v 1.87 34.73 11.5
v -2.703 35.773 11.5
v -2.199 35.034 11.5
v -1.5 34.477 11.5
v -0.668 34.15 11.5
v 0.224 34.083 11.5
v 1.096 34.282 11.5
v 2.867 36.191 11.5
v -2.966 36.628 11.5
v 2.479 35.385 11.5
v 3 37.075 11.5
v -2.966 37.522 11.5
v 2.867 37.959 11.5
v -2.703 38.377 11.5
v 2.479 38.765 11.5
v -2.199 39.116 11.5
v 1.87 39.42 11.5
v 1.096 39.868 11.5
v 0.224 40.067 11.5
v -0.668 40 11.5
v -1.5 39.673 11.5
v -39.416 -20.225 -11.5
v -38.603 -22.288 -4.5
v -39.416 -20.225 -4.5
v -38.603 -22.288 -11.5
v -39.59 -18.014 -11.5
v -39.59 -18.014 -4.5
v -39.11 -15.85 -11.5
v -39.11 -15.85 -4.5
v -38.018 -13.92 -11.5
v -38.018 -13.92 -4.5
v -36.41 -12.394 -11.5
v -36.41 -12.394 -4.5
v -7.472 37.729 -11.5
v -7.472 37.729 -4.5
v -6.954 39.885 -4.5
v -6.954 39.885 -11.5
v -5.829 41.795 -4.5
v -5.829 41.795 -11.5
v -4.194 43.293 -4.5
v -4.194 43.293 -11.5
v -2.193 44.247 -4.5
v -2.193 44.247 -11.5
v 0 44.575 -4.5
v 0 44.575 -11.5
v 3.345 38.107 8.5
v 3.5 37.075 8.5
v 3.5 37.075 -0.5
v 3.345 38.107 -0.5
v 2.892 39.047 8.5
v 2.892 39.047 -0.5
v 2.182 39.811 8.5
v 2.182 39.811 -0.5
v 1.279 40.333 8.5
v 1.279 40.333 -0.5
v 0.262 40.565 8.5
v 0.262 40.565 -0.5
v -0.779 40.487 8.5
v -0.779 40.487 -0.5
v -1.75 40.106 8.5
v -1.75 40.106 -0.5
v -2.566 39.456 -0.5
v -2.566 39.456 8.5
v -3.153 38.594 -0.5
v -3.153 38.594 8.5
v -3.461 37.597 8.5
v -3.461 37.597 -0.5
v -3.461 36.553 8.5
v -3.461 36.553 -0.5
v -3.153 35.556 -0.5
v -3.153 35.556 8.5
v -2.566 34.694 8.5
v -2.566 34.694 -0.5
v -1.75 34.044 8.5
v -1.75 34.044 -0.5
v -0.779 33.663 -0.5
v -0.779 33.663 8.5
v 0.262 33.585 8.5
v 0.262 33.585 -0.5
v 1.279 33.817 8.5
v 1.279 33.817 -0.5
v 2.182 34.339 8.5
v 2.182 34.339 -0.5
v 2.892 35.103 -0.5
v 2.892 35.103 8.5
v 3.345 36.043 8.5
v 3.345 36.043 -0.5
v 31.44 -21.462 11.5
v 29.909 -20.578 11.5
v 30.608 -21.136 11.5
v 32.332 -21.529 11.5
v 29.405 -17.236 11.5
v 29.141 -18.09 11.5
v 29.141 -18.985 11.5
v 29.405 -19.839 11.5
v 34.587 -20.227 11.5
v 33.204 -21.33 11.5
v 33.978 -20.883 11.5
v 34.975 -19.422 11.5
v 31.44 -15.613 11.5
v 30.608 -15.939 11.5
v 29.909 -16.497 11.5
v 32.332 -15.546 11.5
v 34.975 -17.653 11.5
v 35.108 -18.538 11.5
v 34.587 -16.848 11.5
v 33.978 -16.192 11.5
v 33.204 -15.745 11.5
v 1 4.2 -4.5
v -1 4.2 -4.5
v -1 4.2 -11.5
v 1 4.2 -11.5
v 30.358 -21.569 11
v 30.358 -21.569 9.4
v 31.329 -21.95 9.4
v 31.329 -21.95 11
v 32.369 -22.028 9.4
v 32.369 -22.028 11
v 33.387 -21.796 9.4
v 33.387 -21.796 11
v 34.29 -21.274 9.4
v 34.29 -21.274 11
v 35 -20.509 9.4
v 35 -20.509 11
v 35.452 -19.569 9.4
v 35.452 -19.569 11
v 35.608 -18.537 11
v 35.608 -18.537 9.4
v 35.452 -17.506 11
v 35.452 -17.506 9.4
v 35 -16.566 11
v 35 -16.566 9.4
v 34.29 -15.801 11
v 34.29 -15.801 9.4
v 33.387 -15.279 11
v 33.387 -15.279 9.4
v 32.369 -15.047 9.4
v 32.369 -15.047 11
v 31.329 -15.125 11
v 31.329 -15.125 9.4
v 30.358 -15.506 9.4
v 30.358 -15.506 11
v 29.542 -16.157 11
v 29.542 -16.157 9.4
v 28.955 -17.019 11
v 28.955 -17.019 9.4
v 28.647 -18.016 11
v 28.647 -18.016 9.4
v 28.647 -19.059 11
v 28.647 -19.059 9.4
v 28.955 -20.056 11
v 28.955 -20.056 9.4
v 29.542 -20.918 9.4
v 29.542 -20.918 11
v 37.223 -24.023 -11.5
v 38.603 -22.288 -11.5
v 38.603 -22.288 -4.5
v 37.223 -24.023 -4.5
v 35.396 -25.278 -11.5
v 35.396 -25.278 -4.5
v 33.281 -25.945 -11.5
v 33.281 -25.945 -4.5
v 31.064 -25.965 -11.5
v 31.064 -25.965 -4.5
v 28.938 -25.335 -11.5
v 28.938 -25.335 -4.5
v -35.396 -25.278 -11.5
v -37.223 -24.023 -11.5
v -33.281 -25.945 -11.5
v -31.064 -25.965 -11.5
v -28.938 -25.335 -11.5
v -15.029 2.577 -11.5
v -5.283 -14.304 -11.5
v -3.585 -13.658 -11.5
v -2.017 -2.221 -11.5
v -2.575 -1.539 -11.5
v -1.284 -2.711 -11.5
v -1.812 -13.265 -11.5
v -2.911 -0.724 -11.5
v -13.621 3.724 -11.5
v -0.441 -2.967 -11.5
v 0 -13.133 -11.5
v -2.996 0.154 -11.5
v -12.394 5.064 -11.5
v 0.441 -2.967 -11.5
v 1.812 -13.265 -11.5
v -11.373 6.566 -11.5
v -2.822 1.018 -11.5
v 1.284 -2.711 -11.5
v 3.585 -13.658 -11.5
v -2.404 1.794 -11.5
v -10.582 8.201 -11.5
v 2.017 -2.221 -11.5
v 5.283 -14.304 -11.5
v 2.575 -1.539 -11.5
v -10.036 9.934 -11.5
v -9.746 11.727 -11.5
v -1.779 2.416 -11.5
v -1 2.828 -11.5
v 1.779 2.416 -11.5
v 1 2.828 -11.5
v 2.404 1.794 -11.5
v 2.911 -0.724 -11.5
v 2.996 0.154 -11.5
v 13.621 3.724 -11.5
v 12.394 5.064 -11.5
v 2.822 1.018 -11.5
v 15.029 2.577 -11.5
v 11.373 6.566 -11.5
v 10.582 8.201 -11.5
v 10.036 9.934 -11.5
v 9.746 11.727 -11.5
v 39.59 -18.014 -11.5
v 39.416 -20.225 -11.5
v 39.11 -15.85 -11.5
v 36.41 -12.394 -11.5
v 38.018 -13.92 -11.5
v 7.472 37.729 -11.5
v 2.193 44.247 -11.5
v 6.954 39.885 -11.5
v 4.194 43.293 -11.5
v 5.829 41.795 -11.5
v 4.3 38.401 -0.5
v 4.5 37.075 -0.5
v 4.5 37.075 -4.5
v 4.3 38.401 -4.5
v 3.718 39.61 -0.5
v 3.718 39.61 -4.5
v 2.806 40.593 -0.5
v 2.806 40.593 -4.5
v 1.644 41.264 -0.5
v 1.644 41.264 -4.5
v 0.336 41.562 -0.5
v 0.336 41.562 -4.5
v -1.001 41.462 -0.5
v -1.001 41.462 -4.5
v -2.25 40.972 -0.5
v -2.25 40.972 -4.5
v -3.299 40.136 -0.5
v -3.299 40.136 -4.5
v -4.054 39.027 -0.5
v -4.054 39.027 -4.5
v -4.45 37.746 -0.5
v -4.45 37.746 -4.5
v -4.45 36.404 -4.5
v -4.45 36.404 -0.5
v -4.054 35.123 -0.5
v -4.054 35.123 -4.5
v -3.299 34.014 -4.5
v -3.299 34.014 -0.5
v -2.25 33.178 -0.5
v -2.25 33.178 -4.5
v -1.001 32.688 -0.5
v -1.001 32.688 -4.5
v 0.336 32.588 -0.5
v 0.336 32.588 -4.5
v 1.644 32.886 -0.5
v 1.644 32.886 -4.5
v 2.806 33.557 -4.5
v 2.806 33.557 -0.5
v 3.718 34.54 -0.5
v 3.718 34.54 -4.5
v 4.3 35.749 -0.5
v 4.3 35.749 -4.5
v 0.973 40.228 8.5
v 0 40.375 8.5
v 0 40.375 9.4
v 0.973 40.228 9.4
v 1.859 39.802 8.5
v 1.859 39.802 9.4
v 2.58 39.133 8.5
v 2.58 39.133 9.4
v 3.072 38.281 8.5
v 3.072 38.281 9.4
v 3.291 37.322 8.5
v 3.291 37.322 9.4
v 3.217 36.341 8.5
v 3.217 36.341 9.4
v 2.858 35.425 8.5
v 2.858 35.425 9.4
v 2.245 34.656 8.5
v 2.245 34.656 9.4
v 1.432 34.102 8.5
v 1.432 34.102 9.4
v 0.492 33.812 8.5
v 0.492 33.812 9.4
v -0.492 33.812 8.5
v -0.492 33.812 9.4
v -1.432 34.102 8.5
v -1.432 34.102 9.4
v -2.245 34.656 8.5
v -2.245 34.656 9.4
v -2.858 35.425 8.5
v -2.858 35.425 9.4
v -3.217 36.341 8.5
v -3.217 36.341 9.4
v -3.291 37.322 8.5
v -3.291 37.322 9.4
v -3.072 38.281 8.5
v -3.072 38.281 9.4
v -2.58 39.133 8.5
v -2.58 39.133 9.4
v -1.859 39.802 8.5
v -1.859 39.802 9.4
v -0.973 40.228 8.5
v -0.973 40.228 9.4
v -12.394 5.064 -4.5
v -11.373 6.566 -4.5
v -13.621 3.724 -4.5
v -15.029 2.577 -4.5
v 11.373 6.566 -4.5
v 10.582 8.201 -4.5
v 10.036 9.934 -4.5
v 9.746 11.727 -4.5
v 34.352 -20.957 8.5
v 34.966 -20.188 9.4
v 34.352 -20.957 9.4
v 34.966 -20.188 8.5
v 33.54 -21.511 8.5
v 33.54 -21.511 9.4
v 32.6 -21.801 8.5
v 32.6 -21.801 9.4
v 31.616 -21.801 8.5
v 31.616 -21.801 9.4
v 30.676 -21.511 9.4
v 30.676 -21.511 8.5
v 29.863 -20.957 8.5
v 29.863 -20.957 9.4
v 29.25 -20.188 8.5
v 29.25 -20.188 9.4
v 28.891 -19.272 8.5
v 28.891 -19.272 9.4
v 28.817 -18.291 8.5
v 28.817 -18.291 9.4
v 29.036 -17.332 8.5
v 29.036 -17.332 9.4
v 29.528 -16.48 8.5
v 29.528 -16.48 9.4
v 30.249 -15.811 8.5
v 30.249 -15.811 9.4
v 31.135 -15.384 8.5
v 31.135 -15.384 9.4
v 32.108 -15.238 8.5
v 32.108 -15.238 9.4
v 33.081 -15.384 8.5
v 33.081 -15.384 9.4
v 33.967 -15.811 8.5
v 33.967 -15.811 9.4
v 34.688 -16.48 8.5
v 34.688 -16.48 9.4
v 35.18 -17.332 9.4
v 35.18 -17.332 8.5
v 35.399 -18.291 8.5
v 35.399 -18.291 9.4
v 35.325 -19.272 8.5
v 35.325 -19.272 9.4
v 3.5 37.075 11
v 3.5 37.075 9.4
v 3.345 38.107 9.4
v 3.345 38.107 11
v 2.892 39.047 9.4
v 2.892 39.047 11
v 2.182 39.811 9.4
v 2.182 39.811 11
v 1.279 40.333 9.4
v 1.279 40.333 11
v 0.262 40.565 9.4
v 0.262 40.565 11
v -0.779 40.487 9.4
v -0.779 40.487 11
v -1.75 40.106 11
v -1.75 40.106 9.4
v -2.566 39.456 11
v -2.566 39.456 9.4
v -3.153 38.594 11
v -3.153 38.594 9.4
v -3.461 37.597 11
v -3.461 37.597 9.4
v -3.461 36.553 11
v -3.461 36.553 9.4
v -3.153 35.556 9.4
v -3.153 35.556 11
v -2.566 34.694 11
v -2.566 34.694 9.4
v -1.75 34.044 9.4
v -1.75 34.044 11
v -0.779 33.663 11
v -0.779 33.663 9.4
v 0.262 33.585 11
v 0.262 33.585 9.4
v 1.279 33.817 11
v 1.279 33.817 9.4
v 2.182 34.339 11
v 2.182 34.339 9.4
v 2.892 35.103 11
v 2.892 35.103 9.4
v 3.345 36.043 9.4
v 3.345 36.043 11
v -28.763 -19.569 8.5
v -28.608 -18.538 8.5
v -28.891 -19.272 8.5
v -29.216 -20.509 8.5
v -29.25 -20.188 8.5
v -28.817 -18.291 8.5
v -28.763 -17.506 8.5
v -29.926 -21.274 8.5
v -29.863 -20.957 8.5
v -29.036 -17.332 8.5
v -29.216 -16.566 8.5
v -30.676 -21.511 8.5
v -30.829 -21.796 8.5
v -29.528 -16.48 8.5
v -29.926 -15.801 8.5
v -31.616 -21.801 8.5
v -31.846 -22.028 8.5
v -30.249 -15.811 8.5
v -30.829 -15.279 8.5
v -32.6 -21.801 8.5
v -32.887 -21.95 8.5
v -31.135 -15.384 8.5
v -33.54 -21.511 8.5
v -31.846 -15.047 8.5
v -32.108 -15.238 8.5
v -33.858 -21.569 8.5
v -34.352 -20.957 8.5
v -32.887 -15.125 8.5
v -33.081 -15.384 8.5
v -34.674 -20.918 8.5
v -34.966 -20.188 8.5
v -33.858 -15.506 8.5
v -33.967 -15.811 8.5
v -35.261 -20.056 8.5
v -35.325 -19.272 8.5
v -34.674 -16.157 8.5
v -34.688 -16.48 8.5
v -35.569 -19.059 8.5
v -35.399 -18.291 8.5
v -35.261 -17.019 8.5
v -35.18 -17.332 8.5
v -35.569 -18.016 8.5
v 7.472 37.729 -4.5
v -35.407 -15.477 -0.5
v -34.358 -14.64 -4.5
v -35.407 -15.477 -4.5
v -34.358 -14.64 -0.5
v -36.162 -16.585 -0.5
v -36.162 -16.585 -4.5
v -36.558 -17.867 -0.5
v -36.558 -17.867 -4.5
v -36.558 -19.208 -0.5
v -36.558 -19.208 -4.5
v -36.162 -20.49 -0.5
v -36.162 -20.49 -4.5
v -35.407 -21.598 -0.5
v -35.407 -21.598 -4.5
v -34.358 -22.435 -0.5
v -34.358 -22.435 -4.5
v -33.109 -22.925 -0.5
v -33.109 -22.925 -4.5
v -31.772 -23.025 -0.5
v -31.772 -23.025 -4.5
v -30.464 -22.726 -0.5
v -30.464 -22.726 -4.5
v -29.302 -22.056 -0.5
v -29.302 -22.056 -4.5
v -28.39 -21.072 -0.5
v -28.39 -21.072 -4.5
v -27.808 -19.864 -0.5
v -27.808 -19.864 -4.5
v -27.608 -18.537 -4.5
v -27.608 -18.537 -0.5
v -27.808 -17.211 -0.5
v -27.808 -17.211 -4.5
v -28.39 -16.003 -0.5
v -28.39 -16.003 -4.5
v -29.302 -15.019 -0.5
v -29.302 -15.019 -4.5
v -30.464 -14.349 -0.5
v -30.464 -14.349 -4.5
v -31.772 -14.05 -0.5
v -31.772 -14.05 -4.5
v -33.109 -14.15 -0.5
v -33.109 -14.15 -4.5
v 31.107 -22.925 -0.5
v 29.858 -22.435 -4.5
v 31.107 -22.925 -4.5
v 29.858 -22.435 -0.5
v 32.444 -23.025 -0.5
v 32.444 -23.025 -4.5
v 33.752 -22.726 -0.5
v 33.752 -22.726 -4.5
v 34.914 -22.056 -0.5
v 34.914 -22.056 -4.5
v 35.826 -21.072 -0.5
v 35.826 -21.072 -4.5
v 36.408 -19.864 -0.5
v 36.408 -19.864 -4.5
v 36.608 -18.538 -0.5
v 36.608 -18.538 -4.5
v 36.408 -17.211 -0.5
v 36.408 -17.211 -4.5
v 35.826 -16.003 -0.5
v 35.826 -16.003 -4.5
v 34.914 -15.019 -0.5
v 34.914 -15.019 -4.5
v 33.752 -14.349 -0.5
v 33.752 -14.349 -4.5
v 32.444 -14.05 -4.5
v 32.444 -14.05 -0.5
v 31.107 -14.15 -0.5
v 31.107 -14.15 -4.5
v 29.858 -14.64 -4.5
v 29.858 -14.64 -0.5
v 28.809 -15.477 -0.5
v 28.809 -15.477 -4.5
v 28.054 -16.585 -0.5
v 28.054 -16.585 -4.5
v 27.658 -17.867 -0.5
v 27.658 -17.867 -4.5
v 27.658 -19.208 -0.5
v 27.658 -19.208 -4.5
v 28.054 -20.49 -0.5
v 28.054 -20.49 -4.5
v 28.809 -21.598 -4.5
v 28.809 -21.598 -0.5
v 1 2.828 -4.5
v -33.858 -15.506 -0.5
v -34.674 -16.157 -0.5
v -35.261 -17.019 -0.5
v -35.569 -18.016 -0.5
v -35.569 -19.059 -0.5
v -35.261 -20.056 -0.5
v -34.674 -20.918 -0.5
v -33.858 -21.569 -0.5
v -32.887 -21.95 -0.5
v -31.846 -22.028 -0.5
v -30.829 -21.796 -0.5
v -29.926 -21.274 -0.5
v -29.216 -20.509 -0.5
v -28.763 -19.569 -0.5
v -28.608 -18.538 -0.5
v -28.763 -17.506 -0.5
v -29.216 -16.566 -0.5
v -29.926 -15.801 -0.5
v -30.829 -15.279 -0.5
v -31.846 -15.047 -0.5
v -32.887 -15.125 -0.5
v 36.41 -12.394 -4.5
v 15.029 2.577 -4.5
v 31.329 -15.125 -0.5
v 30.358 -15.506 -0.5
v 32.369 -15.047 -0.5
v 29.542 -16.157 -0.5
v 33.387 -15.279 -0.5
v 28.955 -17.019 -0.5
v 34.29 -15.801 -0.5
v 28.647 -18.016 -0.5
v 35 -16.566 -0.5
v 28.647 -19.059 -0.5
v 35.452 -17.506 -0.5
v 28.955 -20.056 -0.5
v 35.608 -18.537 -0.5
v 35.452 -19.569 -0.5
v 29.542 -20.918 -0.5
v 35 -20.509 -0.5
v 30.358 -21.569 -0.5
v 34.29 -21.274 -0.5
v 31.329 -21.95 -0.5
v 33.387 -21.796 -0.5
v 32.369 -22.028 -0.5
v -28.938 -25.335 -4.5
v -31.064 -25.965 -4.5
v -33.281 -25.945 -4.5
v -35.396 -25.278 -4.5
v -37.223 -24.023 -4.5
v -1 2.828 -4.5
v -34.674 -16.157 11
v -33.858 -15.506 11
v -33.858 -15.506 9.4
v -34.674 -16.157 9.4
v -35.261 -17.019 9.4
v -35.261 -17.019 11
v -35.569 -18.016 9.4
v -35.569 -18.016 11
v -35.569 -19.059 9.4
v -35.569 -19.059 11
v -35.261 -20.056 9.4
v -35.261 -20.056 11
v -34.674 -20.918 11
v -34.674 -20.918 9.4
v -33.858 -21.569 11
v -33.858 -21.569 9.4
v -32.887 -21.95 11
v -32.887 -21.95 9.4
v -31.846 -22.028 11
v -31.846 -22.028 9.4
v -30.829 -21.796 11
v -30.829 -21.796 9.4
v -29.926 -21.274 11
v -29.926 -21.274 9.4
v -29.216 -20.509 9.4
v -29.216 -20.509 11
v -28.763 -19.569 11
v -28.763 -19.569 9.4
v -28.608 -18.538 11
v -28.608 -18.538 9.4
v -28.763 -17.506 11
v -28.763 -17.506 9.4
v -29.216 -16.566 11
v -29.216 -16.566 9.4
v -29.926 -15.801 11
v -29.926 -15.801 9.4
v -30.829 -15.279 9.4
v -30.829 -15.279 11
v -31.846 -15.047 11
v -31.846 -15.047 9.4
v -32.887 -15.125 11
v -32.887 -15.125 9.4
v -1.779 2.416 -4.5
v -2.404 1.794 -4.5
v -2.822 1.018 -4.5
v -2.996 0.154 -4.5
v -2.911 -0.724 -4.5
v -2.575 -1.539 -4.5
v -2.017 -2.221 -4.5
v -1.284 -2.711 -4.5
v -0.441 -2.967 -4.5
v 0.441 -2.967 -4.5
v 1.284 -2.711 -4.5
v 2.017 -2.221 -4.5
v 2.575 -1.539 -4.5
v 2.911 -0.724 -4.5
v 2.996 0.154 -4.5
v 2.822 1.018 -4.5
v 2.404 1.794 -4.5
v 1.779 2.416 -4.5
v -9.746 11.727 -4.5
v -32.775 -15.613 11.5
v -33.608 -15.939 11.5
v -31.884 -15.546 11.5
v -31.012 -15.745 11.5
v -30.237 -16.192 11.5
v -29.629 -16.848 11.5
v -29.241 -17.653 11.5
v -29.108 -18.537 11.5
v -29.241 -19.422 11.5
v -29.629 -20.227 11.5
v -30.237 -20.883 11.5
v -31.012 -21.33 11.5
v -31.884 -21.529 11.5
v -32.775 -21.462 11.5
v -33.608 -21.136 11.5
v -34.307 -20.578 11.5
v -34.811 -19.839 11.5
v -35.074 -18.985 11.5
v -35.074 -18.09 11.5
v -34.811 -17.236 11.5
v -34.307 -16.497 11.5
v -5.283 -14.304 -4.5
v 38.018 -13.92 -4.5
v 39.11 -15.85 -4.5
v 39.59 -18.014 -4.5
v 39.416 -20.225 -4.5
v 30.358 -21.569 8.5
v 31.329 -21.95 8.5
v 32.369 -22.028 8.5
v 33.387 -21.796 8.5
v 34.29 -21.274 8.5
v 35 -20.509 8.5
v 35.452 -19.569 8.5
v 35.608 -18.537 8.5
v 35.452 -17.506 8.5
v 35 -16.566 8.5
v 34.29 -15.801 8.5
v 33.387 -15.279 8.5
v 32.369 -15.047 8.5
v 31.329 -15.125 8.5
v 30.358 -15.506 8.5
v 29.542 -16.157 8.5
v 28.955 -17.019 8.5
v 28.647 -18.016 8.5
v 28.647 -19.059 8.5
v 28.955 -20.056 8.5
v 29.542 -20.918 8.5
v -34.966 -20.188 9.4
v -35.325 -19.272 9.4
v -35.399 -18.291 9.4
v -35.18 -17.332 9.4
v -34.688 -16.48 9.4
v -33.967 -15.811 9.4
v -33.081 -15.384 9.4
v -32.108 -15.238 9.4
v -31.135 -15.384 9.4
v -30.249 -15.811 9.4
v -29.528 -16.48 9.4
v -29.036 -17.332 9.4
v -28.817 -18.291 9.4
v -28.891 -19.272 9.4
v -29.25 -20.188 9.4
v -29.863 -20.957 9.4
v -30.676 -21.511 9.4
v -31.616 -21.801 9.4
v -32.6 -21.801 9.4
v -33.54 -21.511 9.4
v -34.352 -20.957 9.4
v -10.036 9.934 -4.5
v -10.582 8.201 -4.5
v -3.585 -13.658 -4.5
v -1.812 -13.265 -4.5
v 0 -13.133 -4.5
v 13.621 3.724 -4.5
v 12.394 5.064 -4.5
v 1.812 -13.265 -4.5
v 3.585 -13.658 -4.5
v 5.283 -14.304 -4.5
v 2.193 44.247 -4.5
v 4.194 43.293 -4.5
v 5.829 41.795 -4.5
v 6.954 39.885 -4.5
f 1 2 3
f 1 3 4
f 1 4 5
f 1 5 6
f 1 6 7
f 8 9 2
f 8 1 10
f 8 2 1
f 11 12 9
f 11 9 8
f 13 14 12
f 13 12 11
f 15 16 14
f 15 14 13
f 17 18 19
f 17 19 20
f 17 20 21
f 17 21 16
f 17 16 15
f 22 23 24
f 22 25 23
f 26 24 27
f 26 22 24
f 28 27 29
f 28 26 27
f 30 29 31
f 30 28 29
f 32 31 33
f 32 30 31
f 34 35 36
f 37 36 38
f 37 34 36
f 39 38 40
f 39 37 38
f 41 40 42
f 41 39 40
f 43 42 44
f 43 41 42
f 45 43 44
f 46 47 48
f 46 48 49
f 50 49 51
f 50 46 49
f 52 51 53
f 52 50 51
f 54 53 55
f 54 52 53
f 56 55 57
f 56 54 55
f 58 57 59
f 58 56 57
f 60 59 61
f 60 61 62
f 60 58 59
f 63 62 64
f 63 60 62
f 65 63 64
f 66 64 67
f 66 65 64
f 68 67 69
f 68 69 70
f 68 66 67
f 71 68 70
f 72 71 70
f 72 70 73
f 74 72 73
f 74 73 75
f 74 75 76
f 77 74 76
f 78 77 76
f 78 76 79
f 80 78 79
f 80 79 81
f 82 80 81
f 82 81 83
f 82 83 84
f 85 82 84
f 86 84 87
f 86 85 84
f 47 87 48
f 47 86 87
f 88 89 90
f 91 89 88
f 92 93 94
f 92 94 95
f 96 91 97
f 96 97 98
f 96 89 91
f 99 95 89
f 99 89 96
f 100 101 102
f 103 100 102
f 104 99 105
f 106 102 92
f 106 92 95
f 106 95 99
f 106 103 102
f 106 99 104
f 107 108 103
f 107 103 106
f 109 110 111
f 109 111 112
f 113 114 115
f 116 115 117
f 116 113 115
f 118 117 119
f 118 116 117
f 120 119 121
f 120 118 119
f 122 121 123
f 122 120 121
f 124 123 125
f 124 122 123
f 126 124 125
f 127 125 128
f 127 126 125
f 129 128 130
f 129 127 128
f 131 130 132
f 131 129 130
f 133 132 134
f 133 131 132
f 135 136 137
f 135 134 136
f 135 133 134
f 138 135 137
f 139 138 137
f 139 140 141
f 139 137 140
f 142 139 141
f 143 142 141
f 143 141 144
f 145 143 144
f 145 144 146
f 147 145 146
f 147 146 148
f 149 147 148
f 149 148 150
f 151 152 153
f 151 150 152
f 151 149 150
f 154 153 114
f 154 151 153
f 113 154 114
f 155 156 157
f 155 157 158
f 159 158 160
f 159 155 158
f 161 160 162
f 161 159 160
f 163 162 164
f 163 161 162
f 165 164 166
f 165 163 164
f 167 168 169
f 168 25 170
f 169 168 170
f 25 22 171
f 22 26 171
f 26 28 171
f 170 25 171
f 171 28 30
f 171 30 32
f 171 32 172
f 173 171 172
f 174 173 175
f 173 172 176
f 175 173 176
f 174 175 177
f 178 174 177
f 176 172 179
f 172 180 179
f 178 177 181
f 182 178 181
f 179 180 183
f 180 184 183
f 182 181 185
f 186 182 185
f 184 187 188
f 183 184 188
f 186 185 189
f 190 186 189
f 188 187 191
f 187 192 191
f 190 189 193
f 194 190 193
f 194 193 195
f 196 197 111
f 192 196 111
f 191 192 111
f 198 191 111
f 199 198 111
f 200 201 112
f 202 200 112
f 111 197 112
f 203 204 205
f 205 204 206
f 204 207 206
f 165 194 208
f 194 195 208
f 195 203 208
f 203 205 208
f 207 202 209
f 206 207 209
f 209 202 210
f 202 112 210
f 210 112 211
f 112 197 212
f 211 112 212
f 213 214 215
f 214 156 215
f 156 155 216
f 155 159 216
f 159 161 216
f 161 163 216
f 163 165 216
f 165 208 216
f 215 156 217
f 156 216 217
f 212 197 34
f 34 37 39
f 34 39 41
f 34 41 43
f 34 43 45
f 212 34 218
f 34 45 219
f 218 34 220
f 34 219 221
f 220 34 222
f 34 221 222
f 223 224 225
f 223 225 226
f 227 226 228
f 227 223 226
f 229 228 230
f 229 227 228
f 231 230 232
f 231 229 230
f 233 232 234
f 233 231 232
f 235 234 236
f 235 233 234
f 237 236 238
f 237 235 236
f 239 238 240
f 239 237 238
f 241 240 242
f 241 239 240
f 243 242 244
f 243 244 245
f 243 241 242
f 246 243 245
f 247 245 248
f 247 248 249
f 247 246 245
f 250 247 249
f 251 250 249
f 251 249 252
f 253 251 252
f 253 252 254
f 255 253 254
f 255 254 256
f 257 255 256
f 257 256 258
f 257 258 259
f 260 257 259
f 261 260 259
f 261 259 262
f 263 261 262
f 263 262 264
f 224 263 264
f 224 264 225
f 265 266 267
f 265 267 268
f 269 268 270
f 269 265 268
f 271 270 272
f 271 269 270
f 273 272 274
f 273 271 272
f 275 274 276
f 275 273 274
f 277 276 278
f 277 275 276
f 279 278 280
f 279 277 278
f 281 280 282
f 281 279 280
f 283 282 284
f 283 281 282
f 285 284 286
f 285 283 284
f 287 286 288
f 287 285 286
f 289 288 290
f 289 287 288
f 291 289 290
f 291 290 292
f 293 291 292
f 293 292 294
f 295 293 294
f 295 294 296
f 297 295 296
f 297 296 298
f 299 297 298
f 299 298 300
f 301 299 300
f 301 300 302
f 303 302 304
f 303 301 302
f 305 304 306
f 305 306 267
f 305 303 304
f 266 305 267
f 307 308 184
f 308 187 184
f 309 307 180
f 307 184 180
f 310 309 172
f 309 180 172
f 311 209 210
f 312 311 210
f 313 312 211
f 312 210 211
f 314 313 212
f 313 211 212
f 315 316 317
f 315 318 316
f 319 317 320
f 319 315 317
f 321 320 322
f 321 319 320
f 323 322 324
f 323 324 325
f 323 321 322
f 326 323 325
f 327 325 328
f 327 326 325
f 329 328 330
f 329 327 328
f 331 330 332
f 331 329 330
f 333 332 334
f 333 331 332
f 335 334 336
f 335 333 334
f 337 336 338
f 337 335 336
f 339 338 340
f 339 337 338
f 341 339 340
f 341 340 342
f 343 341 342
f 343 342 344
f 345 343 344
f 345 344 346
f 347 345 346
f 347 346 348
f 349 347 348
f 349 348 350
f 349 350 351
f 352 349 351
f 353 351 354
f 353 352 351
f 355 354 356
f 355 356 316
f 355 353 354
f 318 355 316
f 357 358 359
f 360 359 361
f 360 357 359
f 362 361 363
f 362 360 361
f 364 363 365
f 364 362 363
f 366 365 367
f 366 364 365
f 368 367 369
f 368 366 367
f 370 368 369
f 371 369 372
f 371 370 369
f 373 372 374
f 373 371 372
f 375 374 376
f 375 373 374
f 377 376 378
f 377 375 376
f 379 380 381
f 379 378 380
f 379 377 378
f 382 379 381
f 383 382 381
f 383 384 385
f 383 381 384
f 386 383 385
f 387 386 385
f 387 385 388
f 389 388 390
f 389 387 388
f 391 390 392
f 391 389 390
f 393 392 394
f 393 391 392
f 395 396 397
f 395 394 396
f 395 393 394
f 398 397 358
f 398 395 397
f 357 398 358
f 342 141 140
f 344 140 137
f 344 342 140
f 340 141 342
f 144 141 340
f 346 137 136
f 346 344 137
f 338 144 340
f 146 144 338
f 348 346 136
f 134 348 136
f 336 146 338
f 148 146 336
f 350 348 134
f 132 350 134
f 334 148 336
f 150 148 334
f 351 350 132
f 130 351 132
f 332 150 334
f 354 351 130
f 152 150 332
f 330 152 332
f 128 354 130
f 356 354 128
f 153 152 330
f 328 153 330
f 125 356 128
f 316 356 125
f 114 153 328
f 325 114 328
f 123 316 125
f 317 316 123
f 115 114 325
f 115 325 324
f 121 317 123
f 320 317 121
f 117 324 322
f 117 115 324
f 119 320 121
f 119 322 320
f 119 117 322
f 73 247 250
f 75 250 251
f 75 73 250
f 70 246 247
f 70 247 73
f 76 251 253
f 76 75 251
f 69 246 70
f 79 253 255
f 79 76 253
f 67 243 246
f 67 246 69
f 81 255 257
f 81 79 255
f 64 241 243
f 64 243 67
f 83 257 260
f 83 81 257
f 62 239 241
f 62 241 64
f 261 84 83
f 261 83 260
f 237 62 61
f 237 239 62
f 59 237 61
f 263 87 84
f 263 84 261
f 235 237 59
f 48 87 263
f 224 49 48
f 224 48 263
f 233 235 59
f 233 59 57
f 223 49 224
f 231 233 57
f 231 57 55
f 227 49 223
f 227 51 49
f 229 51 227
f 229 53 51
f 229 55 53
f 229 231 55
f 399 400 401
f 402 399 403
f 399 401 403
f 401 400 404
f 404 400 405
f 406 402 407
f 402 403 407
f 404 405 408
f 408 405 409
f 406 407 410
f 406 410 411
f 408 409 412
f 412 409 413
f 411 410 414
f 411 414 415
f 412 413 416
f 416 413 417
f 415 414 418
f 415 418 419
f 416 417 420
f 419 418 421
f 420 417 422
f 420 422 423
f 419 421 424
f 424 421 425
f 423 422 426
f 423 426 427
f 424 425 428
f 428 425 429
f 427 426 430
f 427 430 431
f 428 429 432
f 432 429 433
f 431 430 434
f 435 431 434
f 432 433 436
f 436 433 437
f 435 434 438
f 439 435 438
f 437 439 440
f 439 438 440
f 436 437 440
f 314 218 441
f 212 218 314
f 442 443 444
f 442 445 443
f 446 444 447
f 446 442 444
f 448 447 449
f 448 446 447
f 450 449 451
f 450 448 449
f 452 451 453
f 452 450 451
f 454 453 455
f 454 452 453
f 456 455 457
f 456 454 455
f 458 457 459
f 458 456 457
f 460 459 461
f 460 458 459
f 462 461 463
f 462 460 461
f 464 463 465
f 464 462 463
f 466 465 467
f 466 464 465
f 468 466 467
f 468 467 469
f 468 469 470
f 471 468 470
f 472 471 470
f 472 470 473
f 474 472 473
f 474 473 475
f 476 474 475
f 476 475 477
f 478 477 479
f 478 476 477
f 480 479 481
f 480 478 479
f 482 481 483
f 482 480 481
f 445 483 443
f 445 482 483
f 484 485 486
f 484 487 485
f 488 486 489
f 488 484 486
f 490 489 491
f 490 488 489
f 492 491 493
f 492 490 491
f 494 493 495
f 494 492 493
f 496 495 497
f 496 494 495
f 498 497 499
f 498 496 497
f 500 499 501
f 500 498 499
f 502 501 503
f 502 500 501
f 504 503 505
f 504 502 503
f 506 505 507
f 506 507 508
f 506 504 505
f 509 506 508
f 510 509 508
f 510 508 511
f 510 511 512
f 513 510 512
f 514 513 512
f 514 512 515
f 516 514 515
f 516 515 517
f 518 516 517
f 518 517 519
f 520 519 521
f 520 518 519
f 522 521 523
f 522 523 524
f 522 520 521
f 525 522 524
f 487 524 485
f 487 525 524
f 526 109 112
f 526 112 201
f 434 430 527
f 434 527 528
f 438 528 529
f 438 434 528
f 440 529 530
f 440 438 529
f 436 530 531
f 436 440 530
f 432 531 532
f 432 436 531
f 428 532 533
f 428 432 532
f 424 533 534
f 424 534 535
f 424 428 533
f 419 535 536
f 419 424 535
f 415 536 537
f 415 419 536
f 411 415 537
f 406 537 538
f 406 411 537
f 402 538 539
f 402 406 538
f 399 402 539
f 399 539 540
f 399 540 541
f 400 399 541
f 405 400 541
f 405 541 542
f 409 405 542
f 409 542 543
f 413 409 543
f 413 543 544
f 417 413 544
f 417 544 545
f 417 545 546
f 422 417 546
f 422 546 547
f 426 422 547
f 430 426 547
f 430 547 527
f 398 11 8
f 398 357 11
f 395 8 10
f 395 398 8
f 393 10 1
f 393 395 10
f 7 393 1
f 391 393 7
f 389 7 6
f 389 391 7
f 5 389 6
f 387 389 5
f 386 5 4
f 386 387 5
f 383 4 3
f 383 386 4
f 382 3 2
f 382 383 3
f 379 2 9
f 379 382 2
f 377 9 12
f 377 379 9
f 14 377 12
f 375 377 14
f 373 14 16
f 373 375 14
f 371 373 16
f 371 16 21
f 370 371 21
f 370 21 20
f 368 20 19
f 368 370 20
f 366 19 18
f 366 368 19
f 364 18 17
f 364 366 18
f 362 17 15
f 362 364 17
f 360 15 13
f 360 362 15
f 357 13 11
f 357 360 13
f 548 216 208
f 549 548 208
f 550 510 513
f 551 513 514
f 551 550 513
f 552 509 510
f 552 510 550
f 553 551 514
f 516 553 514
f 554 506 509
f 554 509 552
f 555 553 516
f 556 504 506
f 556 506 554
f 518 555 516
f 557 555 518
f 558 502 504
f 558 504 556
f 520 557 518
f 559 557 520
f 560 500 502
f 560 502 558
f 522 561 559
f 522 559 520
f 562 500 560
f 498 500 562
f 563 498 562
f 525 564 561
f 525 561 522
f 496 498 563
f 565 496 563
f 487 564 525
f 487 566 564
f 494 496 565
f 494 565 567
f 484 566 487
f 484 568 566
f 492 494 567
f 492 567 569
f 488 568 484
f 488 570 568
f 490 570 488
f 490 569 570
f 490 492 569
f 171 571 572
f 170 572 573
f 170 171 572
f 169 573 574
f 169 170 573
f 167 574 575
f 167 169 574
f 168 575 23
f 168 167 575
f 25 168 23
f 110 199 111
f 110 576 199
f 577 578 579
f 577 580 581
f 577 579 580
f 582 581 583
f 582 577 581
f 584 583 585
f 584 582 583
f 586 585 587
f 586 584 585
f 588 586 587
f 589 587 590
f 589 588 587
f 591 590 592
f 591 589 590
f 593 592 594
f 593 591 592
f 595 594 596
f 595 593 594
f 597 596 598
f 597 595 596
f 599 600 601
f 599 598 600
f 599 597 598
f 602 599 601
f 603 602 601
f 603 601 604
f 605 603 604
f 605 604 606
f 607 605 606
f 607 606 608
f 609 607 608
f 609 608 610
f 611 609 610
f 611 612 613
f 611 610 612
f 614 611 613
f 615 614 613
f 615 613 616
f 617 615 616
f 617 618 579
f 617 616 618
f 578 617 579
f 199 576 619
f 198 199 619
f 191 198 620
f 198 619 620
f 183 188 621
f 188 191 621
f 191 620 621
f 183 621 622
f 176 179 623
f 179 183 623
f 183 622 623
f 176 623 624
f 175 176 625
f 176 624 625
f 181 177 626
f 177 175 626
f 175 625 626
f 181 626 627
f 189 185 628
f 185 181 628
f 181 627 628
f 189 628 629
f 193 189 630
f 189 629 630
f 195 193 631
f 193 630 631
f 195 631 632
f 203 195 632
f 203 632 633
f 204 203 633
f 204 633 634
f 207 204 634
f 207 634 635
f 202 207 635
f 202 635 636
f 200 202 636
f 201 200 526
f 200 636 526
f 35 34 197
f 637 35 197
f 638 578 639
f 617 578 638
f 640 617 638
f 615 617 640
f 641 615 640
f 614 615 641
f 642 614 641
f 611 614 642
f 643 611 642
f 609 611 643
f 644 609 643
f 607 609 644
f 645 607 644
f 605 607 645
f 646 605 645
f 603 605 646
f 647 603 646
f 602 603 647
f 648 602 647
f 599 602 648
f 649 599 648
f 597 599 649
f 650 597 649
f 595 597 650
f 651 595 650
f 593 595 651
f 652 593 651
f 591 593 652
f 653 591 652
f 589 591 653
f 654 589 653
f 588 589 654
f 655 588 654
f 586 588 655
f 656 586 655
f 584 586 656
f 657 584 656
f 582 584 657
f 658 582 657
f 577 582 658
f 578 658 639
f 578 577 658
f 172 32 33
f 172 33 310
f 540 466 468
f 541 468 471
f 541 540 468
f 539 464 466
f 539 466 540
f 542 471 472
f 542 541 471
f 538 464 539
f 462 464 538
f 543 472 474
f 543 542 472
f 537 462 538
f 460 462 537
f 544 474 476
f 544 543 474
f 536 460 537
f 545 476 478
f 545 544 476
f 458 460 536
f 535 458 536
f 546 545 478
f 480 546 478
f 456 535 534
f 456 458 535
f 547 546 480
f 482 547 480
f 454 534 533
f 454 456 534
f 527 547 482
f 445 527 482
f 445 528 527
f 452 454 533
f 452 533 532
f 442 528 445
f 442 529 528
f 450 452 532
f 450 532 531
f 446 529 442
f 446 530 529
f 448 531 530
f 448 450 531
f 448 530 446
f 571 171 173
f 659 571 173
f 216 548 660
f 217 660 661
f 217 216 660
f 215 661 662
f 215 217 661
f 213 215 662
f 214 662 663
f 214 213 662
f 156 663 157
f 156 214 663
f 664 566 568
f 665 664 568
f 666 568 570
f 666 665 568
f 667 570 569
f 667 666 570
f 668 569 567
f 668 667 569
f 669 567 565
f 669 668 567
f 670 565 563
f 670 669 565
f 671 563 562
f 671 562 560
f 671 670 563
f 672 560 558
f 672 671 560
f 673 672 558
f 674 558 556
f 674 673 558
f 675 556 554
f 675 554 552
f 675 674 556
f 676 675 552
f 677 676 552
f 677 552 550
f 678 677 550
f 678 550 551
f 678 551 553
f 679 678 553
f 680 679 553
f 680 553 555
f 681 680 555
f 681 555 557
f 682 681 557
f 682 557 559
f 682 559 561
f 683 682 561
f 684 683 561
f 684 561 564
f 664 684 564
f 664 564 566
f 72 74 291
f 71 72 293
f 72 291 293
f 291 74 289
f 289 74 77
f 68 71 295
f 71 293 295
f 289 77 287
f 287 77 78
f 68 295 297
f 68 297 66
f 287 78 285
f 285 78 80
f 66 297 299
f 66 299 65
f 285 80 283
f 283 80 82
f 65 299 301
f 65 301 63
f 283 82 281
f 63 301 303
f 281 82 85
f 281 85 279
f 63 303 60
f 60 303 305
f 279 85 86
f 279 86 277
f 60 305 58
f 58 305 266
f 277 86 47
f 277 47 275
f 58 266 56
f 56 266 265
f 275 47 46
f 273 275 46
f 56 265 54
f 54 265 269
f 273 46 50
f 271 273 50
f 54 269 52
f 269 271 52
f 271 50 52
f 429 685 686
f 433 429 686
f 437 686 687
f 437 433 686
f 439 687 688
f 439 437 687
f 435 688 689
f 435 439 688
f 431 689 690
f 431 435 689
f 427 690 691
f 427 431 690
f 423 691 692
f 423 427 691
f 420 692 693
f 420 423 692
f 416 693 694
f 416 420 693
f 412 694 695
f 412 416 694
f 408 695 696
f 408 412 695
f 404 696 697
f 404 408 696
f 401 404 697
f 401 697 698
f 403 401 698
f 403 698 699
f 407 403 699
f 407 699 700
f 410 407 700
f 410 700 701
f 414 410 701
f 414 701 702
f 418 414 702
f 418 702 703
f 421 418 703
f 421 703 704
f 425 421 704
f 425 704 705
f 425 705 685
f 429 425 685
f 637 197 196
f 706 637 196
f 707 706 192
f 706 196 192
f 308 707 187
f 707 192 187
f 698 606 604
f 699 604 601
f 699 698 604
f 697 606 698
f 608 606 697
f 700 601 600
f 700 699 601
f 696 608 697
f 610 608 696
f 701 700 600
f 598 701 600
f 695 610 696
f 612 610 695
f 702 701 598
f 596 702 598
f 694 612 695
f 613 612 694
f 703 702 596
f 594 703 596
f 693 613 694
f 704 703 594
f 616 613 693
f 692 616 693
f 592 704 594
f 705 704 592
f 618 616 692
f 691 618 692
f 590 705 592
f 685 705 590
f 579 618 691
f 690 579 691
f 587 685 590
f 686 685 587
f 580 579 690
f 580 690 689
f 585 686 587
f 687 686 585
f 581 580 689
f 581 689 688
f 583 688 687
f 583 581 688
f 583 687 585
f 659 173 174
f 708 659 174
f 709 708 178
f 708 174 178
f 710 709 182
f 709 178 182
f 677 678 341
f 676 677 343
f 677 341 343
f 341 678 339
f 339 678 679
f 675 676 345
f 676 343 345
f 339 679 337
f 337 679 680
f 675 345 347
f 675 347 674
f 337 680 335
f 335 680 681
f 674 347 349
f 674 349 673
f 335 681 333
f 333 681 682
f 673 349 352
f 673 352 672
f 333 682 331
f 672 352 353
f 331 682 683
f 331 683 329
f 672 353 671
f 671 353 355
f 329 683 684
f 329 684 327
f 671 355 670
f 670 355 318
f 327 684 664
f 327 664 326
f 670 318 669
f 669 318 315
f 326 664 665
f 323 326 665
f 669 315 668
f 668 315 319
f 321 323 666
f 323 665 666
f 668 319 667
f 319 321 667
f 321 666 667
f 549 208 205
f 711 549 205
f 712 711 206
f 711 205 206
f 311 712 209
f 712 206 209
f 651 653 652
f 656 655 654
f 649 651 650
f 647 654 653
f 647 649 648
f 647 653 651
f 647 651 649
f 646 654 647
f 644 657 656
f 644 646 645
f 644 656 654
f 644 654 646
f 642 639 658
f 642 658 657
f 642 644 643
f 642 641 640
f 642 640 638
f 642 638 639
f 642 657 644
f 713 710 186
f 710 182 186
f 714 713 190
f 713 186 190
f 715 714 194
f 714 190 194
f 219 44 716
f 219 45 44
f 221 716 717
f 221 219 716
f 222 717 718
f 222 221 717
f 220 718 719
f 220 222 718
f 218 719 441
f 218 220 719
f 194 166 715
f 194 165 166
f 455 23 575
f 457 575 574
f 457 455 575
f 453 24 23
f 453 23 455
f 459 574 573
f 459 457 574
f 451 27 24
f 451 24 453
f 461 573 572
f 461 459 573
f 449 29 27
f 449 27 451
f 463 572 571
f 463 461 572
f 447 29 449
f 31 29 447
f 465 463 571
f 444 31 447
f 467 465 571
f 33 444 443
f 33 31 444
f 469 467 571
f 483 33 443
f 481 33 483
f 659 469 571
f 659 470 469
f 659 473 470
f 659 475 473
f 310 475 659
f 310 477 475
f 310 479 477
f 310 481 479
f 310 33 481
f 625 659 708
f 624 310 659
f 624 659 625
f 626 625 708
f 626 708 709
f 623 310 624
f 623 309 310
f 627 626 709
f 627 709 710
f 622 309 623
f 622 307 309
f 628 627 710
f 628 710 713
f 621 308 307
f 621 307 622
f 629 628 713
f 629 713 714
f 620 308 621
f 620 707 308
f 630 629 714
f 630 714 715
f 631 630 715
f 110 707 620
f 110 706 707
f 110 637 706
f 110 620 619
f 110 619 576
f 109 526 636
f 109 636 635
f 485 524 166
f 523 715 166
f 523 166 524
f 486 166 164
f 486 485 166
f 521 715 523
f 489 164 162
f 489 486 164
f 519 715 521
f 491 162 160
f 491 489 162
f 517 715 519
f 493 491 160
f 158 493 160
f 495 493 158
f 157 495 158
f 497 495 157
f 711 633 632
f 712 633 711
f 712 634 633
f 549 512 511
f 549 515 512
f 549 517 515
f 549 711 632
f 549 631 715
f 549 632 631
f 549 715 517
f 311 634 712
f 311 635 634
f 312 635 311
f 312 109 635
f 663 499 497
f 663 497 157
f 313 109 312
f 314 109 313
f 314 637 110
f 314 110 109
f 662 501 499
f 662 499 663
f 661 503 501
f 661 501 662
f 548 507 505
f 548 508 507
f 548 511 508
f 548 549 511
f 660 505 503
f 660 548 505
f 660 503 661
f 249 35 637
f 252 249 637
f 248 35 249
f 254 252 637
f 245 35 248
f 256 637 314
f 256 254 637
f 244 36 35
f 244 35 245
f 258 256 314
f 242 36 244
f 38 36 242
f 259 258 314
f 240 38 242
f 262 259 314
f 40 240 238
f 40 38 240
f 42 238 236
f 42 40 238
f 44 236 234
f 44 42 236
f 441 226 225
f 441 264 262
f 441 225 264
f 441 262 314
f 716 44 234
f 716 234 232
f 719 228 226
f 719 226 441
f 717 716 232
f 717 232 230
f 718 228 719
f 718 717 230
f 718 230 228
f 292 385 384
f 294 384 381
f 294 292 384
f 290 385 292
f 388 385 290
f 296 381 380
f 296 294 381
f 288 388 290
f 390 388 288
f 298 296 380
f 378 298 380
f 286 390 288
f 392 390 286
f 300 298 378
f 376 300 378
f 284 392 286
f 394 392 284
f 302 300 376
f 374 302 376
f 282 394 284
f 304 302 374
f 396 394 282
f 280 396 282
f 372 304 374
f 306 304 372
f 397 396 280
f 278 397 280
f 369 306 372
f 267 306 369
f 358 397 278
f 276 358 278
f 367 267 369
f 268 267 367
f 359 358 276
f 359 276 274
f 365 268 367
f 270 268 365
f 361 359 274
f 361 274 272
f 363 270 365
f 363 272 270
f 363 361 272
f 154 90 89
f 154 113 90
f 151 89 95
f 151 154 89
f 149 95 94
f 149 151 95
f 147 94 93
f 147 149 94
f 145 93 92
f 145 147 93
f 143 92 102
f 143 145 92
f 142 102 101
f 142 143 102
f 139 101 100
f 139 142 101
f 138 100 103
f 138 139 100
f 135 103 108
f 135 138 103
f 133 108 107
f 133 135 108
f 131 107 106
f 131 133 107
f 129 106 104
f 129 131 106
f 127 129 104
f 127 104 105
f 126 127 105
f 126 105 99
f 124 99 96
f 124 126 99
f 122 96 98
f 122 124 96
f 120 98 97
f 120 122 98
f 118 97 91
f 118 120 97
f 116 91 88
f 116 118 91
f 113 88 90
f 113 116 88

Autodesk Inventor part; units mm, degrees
ref_plane "YZ Plane" through (0, 0, 0) normal (1, 0, 0) x (0, 1, 0)
ref_plane "XZ Plane" through (0, 0, 0) normal (0, 1, 0) x (-1, 0, 0)
ref_plane "XY Plane" through (0, 0, 0) normal (0, 0, 1) x (1, 0, 0)
sketch "Sketch1" plane through (0, 0, 0) normal (0, 1, 0) x (-1, 0, 0)
  line L0 (0, -16.1) -> (0, 16.1) construction
  line L1 (-54, 0) -> (9, 0) construction
  line L2 (-3, 11.5) -> (-45, 11.5)
  line L3 (-45, 11.5) -> (-45, -11.5)
  line L4 (-45, -11.5) -> (-3, -11.5)
  line L5 (-3, -11.5) -> (-3, 11.5)
  point P0 (0, 0)
  dimension "d1" = 23
  dimension "d4" = 45
  dimension "d36" = 3
revolve "Revolution1" add sketch "Sketch1" angle 360 about axis through (0, 0, 0) along (0, 0, 1)
sketch "Sketch2" plane through (0, 0, -11.5) normal (0, 0, -1) x (-1, 0, 0)
  line L0 (0, -63.2055) -> (0, 64.2333) construction
  line L1 (-63, 0) -> (63, 0) construction
  arc A0 (7.4715, 37.7287) -> (0, 44.575) centre (0, 37.075) ccw
  line L2 (0, 0) -> (38.9711, -22.5) construction
  circle A1 centre (0, 0) radius 45 projected
  line L3 (0, 0) -> (-38.9711, -22.5) construction
  line L4 (0, 0) -> (38.9711, 22.5)
  arc A2 (9.7463, 11.727) -> (11.3734, 6.5665) centre (22.1987, 12.8165) ccw
  line L5 (7.4715, 37.7287) -> (9.7463, 11.727)
  arc A3 (0, 44.575) -> (-7.4715, 37.7287) centre (0, 37.075) ccw
  arc A4 (-11.3734, 6.5665) -> (-9.7463, 11.727) centre (-22.1987, 12.8165) ccw
  line L6 (-7.4715, 37.7287) -> (-9.7463, 11.727)
  line L7 (0, 0) -> (-2.1651, 1.25)
  line L8 (-11.3734, 6.5665) -> (-38.9711, 22.5)
  point P0 (-38.9711, 22.5)
  point P1 (0, 45)
  point P2 (0, 45)
  dimension "d6" = 15
  dimension "d7" = 120
  dimension "d8" = 120
  dimension "d9" = 60
  dimension "d10" = 60
  dimension "d11" = 37.075
  dimension "d12" = 25
  dimension "d13" = 5
extrude "Extrusion1" cut sketch "Sketch2" against normal through all contours A0 A3 L6 A4 L8 A1 L4 A2 L5 picked at (-14.556, 28.6205)
sketch "Sketch4" plane through (0, 0, 11.5) normal (0, 0, 1) x (1, 0, 0)
  line L0 (38.9711, 22.5) -> (11.3734, 6.5665) projected
  arc A0 (9.7463, 11.727) -> (11.3734, 6.5665) centre (22.1987, 12.8165) ccw projected
  line L1 (9.7463, 11.727) -> (7.4715, 37.7287) projected
  arc A1 (7.4715, 37.7287) -> (-7.4715, 37.7287) centre (0, 37.075) ccw projected
  line L2 (-7.4715, 37.7287) -> (-9.7463, 11.727) projected
  arc A2 (-11.3734, 6.5665) -> (-9.7463, 11.727) centre (-22.1987, 12.8165) ccw projected
  line L3 (-11.3734, 6.5665) -> (-38.9711, 22.5) projected
  arc A3 (-38.9711, 22.5) -> (38.9711, 22.5) centre (0, 0) ccw projected
  circle A4 centre (0, 37.075) radius 4.5
  line L4 (-38.9711, 22.5) -> (0, 0)
  line L5 (0, 0) -> (38.9711, 22.5)
  circle A5 centre (0, 37.075) radius 3.5
  point P0 (-11.3734, 6.5665)
  dimension "d20" = 9
  dimension "d23" = 7
extrude "Extrusion2" cut sketch "Sketch4" against normal blind 16 contours L5 L4 A2 L2 A1 L1 A0
extrude "Extrusion4" cut sketch "Sketch4" against normal blind 12 contours A4
sketch "Sketch6" plane through (0, 0, 0) normal (1, 0, 0) x (0, 1, 0)
  line L0 (40.575, -0.5) -> (33.575, -0.5) projected
  line L1 (40.575, 11.5) -> (33.575, 11.5) projected
  line L2 (33.575, -0.5) -> (33.575, 11.5) projected
  line L3 (40.575, -0.5) -> (40.575, 11.5) projected
  line L4 (40.575, 9.4) -> (40.375, 9.4)
  line L5 (40.375, 9.4) -> (40.375, 8.5)
  line L6 (40.375, 8.5) -> (40.575, 8.5)
  line L7 (40.575, 8.5) -> (40.575, 9.4)
  line L8 (37.075, 16.1) -> (37.075, -16.1) projected
  point P0 (0, 0)
  dimension "d29" = 9
  dimension "d34" = 6.8
  dimension "d35" = 0.9
revolve "Revolution2" cut sketch "Sketch6" angle 360 about axis through (0, 37.075, 11.5) along (0, 0, -1) contours L6 L5 L4 L3
chamfer "Chamfer1" distance 0.5 angle 45 1 edges at (-3.5, 37.075, 11.5)
pattern_circular "Circular Pattern1" count 3 over 360 about axis through (0, 0, -10) along (0, 0, 1) of "Extrusion1", "Extrusion2", "Extrusion4", "Revolution2", "Chamfer1"
sketch "Sketch7" plane through (0, 0, -4.5) normal (0, 0, 1) x (1, 0, 0)
  circle A0 centre (0, 0) radius 3 construction
  line L0 (-1, 4.2) -> (1, 4.2)
  line L1 (1, 4.2) -> (1, 2)
  line L2 (1, 2) -> (-1, 2)
  line L3 (-1, 2) -> (-1, 4.2)
  line L4 (0, 58.6975) -> (0, -40.16) construction
  line L5 (-55.451, 0) -> (55.451, 0) construction
  dimension "d37" = 2
  dimension "d38" = 2.2
  dimension "d39" = 2
extrude "Extrusion5" cut sketch "Sketch7" against normal through all
equation "\"d9\" = d10"
properties part number "Shaft_interstage" material "Steel"
